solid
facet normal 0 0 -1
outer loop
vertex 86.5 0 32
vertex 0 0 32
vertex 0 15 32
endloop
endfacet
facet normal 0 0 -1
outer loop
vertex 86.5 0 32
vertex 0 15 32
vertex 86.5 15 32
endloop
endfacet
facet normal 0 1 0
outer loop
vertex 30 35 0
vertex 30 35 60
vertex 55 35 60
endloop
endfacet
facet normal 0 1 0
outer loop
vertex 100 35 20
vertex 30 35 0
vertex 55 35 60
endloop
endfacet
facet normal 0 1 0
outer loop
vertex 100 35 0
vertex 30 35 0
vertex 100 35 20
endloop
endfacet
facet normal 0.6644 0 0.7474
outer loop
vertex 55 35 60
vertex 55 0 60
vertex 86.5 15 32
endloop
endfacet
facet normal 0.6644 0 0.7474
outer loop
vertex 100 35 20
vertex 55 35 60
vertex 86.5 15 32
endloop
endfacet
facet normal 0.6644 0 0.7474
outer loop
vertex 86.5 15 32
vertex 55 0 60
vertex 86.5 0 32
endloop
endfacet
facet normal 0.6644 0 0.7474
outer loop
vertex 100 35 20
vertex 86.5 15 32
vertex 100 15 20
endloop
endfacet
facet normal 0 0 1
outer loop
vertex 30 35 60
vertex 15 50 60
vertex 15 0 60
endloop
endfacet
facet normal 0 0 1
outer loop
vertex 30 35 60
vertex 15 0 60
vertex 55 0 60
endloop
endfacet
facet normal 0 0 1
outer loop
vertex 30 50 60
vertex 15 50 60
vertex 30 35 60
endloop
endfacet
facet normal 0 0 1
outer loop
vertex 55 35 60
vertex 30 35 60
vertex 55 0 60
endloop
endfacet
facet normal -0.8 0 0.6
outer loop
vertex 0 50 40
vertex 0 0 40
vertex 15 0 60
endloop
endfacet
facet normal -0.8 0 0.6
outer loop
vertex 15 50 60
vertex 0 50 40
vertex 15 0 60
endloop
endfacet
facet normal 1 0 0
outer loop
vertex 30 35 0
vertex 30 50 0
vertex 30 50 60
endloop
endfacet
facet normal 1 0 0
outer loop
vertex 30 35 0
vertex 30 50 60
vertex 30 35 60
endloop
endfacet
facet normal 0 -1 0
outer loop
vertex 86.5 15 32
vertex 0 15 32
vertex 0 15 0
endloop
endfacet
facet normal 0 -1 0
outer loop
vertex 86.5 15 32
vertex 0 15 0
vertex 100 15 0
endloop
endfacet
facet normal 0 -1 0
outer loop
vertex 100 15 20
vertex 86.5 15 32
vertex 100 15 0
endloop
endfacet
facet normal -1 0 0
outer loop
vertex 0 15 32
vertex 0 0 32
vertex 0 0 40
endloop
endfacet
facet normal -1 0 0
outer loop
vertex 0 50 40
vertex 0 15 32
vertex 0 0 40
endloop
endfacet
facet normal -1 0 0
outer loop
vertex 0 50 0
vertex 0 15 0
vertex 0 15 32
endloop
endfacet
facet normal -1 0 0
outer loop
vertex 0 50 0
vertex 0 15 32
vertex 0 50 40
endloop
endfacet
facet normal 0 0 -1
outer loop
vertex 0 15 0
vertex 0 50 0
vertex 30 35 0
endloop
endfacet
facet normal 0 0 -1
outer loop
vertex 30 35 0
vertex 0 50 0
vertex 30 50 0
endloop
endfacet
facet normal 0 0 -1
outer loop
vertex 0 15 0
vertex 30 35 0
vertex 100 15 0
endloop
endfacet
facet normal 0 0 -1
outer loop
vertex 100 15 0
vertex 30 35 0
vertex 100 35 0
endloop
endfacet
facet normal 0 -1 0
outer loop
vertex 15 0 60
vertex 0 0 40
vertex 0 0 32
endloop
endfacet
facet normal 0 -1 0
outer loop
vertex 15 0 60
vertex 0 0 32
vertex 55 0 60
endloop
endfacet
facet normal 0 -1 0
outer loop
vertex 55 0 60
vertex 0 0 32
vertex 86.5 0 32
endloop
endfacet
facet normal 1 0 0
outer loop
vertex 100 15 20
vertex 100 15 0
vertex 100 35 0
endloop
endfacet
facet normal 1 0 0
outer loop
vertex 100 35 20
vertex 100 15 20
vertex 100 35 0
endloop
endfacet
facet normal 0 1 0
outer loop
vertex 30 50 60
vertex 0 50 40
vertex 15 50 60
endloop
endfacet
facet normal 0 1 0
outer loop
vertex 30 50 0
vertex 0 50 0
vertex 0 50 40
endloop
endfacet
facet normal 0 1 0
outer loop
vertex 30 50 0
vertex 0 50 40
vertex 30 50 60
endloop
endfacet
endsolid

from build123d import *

# Parameters (mm, degrees)
F0_W     = 100
F0_H     = 50
F1_DEPTH = 60
F3_DEPTH = 50.001
F4_W     = 100
F4_H     = 32
F5_DEPTH = 15
F6_W     = 70
F6_H     = 15
F7_DEPTH = 60.001


with BuildPart() as f1:
    # F0 (on Top) → F1 (new body)
    with BuildSketch(Plane.XY):
        with Locations((50, 25)):
            Rectangle(F0_W, F0_H)
    extrude(amount=F1_DEPTH)

    # F2 (on face) → F3 (cut, through all)
    with BuildSketch(Plane.XZ):
        Polygon((15, 60), (0, 60), (0, 40), align=None)
        Polygon((55, 60), (100, 20), (100, 60), align=None)
    extrude(amount=-F3_DEPTH, mode=Mode.SUBTRACT)

    # F4 (on face) → F5 (cut)
    with BuildSketch(Plane.XZ):
        with Locations((50, 16)):
            Rectangle(F4_W, F4_H)
    extrude(amount=-F5_DEPTH, mode=Mode.SUBTRACT)

    # F6 (on face) → F7 (cut, through all)
    with BuildSketch(Plane(origin=(0, 0, 0), x_dir=(1, 0, 0), z_dir=(0, 0, -1))):
        with Locations((65, -42.5)):
            Rectangle(F6_W, F6_H)
    extrude(amount=-F7_DEPTH, mode=Mode.SUBTRACT)


solid = f1.part
